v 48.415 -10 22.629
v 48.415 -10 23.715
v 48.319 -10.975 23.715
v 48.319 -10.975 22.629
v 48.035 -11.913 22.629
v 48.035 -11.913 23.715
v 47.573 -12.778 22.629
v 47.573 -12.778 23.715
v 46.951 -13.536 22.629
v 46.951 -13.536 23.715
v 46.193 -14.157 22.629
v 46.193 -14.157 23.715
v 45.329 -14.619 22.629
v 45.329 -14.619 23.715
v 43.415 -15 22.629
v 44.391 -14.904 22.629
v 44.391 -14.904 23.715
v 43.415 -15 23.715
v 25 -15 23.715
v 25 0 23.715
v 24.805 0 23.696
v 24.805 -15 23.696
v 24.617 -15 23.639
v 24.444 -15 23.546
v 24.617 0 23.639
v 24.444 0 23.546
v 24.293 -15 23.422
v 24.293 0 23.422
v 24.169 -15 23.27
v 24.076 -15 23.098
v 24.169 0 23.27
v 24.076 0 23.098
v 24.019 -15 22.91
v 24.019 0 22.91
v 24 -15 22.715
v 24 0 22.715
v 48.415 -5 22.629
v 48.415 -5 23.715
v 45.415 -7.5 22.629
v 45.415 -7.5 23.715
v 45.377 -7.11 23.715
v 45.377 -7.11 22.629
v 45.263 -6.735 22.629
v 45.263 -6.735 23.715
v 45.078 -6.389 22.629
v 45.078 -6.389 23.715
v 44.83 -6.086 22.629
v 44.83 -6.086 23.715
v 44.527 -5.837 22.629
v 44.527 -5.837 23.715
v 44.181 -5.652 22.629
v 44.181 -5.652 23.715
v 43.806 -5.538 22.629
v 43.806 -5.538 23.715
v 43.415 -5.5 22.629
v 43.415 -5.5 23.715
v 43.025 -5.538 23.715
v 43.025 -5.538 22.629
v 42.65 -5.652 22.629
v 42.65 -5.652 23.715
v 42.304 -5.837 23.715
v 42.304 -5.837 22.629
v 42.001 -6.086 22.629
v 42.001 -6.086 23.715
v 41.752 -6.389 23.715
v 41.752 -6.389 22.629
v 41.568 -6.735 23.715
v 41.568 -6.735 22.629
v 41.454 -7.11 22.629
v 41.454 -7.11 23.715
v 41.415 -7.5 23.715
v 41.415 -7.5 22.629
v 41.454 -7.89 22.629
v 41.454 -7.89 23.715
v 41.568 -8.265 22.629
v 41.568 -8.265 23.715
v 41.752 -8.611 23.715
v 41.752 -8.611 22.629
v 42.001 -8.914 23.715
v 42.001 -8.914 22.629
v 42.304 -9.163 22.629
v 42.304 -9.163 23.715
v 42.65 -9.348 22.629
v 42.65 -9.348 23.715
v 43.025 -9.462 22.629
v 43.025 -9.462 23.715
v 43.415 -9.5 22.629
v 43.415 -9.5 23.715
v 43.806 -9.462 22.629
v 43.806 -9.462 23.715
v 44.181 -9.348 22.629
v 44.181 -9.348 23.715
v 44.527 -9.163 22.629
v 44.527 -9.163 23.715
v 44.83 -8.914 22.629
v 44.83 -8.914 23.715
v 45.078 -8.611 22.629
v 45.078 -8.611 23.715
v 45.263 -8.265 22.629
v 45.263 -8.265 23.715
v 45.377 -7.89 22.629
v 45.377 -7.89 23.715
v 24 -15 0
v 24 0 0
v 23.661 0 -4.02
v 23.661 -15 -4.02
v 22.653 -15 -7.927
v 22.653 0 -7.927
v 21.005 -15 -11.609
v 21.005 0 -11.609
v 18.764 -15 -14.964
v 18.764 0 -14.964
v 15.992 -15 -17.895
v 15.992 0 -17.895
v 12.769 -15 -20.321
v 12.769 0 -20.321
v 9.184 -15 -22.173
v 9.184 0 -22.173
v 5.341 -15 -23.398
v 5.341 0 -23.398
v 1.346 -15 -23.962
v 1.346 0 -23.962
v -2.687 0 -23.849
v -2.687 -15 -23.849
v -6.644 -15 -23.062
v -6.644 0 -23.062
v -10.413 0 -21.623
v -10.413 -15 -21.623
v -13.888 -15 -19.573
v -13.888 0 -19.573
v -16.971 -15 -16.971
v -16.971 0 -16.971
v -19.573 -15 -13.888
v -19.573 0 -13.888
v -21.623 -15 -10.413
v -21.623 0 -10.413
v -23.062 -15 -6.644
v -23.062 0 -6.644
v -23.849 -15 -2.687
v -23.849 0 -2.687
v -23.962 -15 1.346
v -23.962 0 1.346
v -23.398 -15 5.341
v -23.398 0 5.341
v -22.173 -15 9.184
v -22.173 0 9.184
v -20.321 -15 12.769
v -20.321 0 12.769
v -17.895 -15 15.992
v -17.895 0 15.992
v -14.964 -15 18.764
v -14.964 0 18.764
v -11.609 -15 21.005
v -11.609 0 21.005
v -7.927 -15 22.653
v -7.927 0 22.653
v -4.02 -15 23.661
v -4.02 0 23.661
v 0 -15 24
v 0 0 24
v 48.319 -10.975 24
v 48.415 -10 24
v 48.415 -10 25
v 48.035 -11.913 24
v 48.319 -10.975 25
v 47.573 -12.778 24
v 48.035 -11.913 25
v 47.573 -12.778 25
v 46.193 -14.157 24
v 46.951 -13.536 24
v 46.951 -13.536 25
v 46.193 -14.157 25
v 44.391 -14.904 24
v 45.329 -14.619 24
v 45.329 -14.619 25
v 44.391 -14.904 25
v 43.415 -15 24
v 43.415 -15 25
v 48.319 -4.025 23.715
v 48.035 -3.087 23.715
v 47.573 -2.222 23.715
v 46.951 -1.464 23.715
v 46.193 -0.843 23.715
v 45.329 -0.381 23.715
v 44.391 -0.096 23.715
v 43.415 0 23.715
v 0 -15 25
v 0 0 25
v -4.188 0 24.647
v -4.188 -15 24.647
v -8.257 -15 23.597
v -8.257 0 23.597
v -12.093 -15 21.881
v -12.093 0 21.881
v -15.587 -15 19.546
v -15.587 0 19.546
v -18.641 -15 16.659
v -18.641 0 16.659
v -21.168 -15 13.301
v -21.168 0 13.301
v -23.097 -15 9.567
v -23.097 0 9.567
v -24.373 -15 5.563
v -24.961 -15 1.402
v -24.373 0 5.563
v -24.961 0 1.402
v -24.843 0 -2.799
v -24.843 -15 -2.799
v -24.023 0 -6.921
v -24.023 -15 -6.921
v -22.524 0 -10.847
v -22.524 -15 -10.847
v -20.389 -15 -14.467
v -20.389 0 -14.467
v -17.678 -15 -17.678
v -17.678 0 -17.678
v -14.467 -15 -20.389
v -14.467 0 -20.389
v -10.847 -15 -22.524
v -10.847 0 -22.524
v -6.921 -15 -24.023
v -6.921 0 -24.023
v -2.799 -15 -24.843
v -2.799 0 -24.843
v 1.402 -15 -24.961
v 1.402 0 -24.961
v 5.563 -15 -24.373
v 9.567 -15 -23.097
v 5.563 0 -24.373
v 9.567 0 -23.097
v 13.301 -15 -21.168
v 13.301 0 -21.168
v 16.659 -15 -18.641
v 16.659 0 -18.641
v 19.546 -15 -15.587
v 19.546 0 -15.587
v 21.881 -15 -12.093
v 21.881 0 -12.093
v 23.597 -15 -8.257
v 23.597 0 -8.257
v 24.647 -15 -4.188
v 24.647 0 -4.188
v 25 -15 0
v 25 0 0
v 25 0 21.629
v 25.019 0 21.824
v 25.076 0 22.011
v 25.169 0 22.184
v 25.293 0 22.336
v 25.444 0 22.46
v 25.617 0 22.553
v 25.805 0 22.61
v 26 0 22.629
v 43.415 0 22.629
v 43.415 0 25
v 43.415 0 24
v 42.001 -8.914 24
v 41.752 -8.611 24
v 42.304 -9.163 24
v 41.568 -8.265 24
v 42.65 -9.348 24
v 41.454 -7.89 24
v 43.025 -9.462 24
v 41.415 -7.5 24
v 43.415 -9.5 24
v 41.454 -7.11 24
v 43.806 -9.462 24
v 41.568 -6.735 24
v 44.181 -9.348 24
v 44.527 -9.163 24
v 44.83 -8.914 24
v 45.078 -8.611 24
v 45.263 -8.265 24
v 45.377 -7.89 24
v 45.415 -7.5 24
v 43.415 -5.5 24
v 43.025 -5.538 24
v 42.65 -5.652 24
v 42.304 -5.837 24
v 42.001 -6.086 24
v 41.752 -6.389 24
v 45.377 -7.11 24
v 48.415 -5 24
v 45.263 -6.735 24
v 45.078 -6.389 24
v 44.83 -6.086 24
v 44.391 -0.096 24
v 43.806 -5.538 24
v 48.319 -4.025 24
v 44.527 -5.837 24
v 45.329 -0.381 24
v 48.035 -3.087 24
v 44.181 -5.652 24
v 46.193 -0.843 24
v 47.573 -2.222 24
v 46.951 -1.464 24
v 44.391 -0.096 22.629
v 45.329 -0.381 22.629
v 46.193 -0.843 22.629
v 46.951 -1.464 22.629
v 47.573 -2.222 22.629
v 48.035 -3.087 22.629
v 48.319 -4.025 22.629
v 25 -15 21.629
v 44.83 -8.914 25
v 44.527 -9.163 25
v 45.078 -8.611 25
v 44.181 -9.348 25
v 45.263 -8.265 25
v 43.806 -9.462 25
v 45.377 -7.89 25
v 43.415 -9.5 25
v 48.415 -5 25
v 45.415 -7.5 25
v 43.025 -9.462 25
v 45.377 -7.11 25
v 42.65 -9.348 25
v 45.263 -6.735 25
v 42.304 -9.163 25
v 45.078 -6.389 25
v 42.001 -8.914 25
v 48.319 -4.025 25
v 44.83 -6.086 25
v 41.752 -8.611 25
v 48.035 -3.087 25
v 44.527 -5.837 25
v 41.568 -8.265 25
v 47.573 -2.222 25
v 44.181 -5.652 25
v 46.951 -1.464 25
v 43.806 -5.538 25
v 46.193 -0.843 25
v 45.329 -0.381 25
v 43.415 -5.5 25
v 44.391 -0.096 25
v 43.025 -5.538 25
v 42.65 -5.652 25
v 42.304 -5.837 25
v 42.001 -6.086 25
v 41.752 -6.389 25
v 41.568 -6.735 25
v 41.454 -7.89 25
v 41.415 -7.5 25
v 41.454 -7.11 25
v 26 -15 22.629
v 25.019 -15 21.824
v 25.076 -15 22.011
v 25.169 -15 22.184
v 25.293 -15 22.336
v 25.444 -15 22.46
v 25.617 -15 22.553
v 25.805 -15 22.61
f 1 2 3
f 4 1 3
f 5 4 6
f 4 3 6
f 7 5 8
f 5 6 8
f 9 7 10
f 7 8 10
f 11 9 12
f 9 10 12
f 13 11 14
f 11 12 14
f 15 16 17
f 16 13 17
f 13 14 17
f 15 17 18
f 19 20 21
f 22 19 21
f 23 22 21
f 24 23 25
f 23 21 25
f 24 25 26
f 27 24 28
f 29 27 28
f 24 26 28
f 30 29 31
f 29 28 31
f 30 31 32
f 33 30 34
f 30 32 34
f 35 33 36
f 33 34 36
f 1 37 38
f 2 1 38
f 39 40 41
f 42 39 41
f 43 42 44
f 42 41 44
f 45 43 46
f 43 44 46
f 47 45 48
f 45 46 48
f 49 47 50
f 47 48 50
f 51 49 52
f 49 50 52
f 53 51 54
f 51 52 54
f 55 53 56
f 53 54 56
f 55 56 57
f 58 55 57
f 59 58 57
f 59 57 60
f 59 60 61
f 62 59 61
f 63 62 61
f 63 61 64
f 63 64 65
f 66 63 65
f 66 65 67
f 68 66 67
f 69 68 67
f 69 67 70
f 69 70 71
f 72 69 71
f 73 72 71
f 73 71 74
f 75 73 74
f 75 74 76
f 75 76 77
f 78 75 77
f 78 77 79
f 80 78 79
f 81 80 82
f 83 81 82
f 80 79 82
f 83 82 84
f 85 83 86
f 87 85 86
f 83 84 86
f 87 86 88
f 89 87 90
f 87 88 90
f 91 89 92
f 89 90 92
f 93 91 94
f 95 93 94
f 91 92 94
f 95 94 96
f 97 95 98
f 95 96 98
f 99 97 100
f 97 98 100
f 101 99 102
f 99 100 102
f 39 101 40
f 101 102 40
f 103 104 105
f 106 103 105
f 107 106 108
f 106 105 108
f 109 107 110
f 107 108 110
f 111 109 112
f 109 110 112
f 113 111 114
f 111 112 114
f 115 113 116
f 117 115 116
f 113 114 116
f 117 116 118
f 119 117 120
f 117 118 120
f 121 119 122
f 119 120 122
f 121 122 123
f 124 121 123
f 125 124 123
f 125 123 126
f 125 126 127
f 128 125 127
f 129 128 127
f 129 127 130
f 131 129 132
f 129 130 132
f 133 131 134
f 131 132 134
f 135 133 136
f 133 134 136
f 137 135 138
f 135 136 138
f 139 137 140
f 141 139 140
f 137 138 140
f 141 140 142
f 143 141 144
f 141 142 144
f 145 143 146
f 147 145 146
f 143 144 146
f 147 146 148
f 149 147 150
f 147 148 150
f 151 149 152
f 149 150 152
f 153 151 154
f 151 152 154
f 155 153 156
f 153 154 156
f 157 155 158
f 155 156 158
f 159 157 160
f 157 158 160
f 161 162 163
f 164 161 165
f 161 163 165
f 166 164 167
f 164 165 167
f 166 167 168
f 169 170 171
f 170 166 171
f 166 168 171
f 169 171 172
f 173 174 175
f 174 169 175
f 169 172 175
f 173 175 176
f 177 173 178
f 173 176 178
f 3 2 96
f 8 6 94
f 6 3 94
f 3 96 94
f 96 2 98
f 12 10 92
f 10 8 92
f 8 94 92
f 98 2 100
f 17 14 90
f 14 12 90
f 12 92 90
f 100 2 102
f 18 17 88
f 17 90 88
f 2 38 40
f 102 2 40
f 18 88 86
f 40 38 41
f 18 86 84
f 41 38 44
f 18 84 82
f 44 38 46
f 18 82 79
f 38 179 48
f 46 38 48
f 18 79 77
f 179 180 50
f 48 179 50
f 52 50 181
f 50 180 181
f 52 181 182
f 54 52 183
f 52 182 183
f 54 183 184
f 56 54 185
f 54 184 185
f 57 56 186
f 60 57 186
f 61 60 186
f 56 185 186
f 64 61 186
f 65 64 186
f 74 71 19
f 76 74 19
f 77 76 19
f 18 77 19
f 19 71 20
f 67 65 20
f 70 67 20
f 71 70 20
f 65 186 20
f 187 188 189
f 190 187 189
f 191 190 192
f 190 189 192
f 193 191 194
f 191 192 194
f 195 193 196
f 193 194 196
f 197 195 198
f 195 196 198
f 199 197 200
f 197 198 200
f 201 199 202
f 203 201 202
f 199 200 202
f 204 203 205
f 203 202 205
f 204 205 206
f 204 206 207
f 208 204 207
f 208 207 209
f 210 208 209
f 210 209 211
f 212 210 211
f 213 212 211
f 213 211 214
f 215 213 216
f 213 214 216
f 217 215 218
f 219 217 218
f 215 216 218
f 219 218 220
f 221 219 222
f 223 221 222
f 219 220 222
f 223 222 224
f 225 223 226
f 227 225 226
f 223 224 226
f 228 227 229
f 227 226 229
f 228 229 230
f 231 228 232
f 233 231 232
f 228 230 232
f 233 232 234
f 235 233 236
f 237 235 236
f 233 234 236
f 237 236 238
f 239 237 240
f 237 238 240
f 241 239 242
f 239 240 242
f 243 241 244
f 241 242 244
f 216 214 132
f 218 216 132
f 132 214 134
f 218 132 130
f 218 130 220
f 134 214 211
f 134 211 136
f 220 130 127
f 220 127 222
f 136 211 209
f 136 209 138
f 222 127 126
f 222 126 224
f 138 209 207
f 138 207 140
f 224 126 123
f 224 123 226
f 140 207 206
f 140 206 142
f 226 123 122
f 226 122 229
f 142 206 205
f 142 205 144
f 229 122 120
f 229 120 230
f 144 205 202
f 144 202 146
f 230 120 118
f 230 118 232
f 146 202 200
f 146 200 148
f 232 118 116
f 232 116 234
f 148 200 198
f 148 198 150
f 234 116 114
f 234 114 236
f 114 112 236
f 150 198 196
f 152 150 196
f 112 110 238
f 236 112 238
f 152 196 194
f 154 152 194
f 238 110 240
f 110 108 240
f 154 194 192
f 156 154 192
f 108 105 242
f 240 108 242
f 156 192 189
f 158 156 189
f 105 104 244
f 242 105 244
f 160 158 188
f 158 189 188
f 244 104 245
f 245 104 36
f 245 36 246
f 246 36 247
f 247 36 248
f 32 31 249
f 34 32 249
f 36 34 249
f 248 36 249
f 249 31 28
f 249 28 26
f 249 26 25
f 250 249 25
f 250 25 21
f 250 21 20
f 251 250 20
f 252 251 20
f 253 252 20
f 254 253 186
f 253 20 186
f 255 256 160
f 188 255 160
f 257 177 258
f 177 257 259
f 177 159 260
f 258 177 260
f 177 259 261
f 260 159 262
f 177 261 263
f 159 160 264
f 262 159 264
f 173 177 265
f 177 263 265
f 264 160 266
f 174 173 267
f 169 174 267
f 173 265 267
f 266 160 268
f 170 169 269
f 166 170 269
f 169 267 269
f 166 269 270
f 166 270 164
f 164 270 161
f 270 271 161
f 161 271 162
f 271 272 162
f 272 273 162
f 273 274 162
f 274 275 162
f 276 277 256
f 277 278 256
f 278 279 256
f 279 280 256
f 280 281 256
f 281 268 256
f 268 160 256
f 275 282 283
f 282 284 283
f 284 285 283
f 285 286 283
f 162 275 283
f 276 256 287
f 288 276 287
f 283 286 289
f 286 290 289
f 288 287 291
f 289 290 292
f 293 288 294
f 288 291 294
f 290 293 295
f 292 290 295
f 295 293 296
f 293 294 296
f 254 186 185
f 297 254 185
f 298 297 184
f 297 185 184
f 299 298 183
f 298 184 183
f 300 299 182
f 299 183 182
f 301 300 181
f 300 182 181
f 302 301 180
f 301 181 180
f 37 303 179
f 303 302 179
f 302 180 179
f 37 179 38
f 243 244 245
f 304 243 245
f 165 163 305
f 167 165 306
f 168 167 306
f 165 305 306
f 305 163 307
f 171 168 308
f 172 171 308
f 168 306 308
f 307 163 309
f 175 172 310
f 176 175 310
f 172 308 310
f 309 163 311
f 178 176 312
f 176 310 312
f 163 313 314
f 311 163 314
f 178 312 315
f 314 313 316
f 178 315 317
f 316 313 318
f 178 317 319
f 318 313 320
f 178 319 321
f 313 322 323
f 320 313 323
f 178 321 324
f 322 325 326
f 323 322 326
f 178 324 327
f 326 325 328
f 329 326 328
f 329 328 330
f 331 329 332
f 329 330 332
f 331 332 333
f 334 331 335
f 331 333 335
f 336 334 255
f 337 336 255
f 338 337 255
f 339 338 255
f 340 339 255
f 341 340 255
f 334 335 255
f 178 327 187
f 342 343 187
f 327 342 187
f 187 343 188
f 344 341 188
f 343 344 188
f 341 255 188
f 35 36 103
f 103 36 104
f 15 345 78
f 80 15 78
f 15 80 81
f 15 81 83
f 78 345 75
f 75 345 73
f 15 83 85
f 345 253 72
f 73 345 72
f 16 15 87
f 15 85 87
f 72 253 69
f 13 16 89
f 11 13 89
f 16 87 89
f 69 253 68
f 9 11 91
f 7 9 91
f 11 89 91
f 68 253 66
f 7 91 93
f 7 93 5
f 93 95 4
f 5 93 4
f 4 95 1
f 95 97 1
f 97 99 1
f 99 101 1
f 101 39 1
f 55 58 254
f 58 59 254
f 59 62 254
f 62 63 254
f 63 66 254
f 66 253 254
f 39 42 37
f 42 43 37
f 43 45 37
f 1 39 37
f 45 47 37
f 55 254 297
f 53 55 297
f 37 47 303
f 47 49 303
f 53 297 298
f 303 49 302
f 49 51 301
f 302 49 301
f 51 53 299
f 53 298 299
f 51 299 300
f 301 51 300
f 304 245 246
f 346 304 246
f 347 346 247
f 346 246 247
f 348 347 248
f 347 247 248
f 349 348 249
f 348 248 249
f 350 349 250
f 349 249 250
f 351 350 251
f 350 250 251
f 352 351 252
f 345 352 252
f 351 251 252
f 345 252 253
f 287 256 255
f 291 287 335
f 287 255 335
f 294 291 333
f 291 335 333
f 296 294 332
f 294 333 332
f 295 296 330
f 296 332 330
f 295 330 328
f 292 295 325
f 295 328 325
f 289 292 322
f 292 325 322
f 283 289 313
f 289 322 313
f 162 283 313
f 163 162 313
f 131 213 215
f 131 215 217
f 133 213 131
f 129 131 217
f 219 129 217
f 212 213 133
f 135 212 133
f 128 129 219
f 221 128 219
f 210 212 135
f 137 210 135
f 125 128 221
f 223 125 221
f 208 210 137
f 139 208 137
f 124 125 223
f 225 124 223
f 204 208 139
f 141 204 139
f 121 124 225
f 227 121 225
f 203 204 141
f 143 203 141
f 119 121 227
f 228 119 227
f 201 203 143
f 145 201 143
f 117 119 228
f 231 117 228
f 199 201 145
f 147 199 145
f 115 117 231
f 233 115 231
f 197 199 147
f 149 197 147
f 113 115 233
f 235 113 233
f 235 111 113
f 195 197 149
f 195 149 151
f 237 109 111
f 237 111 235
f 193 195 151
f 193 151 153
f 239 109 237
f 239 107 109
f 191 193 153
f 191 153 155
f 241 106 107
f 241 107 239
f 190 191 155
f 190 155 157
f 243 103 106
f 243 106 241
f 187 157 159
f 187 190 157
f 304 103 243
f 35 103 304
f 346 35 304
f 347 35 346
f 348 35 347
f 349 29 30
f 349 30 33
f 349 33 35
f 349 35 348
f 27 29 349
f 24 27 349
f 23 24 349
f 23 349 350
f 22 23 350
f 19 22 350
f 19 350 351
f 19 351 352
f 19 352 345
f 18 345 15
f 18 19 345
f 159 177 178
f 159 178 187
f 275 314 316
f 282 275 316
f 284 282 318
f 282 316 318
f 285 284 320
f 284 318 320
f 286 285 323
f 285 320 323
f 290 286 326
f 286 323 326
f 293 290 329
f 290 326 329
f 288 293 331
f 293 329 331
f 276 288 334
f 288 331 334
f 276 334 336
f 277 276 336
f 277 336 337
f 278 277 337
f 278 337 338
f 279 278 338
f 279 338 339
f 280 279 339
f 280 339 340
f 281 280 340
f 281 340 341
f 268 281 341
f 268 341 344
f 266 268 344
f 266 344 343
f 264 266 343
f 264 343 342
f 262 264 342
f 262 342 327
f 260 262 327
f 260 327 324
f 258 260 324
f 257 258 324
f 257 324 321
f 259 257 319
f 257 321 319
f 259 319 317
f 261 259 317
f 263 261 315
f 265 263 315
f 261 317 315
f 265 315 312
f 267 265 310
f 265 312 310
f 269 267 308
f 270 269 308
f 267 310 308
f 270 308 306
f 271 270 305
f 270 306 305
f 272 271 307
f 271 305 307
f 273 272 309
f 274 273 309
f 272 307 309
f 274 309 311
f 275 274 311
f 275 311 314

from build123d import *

# Parameters (mm, degrees)
F1_DEPTH = 15
F2_R     = 2
F3_DEPTH = 25


with BuildPart() as f1:
    # F0 (on Front) → F1 (new body)
    with BuildSketch(Plane.XZ):
        with BuildLine():
            Line((48.415434, 25), (0, 25))
            ThreePointArc((0, 25), (-17.67767, -17.67767), (25, 0))
            Line((25, 0), (25, 21.628764))
            ThreePointArc((25, 21.628764), (25.292893, 22.33587), (26, 22.628764))
            Line((26, 22.628764), (48.415434, 22.628764))
            Line((48.415434, 22.628764), (48.415434, 23.714876))
            Line((48.415434, 23.714876), (25, 23.714876))
            ThreePointArc((25, 23.714876), (24.292893, 23.421983), (24, 22.714876))
            Line((24, 22.714876), (24, 7))
            Line((24, 7), (24, 0))
            ThreePointArc((24, 0), (-16.970563, -16.970563), (0, 24))
            Line((0, 24), (7, 24))
            Line((7, 24), (48.415434, 24))
            Line((48.415434, 24), (48.415434, 25))
        make_face()
    extrude(amount=F1_DEPTH)

    # F2 (on face) → F3 (cut)
    with BuildSketch(Plane.XY.offset(25)):
        with BuildLine():
            Line((48.415434, 0), (43.415434, 0))
            ThreePointArc((43.415434, 0), (46.950968, -1.464466), (48.415434, -5))
            Line((48.415434, -5), (48.415434, 0))
        make_face()
        with BuildLine():
            Line((48.415434, -15), (48.415434, -10))
            ThreePointArc((48.415434, -10), (46.950968, -13.535534), (43.415434, -15))
            Line((43.415434, -15), (48.415434, -15))
        make_face()
        with Locations((43.415434, -7.5)):
            Circle(F2_R)
    extrude(amount=-F3_DEPTH, mode=Mode.SUBTRACT)


solid = f1.part
